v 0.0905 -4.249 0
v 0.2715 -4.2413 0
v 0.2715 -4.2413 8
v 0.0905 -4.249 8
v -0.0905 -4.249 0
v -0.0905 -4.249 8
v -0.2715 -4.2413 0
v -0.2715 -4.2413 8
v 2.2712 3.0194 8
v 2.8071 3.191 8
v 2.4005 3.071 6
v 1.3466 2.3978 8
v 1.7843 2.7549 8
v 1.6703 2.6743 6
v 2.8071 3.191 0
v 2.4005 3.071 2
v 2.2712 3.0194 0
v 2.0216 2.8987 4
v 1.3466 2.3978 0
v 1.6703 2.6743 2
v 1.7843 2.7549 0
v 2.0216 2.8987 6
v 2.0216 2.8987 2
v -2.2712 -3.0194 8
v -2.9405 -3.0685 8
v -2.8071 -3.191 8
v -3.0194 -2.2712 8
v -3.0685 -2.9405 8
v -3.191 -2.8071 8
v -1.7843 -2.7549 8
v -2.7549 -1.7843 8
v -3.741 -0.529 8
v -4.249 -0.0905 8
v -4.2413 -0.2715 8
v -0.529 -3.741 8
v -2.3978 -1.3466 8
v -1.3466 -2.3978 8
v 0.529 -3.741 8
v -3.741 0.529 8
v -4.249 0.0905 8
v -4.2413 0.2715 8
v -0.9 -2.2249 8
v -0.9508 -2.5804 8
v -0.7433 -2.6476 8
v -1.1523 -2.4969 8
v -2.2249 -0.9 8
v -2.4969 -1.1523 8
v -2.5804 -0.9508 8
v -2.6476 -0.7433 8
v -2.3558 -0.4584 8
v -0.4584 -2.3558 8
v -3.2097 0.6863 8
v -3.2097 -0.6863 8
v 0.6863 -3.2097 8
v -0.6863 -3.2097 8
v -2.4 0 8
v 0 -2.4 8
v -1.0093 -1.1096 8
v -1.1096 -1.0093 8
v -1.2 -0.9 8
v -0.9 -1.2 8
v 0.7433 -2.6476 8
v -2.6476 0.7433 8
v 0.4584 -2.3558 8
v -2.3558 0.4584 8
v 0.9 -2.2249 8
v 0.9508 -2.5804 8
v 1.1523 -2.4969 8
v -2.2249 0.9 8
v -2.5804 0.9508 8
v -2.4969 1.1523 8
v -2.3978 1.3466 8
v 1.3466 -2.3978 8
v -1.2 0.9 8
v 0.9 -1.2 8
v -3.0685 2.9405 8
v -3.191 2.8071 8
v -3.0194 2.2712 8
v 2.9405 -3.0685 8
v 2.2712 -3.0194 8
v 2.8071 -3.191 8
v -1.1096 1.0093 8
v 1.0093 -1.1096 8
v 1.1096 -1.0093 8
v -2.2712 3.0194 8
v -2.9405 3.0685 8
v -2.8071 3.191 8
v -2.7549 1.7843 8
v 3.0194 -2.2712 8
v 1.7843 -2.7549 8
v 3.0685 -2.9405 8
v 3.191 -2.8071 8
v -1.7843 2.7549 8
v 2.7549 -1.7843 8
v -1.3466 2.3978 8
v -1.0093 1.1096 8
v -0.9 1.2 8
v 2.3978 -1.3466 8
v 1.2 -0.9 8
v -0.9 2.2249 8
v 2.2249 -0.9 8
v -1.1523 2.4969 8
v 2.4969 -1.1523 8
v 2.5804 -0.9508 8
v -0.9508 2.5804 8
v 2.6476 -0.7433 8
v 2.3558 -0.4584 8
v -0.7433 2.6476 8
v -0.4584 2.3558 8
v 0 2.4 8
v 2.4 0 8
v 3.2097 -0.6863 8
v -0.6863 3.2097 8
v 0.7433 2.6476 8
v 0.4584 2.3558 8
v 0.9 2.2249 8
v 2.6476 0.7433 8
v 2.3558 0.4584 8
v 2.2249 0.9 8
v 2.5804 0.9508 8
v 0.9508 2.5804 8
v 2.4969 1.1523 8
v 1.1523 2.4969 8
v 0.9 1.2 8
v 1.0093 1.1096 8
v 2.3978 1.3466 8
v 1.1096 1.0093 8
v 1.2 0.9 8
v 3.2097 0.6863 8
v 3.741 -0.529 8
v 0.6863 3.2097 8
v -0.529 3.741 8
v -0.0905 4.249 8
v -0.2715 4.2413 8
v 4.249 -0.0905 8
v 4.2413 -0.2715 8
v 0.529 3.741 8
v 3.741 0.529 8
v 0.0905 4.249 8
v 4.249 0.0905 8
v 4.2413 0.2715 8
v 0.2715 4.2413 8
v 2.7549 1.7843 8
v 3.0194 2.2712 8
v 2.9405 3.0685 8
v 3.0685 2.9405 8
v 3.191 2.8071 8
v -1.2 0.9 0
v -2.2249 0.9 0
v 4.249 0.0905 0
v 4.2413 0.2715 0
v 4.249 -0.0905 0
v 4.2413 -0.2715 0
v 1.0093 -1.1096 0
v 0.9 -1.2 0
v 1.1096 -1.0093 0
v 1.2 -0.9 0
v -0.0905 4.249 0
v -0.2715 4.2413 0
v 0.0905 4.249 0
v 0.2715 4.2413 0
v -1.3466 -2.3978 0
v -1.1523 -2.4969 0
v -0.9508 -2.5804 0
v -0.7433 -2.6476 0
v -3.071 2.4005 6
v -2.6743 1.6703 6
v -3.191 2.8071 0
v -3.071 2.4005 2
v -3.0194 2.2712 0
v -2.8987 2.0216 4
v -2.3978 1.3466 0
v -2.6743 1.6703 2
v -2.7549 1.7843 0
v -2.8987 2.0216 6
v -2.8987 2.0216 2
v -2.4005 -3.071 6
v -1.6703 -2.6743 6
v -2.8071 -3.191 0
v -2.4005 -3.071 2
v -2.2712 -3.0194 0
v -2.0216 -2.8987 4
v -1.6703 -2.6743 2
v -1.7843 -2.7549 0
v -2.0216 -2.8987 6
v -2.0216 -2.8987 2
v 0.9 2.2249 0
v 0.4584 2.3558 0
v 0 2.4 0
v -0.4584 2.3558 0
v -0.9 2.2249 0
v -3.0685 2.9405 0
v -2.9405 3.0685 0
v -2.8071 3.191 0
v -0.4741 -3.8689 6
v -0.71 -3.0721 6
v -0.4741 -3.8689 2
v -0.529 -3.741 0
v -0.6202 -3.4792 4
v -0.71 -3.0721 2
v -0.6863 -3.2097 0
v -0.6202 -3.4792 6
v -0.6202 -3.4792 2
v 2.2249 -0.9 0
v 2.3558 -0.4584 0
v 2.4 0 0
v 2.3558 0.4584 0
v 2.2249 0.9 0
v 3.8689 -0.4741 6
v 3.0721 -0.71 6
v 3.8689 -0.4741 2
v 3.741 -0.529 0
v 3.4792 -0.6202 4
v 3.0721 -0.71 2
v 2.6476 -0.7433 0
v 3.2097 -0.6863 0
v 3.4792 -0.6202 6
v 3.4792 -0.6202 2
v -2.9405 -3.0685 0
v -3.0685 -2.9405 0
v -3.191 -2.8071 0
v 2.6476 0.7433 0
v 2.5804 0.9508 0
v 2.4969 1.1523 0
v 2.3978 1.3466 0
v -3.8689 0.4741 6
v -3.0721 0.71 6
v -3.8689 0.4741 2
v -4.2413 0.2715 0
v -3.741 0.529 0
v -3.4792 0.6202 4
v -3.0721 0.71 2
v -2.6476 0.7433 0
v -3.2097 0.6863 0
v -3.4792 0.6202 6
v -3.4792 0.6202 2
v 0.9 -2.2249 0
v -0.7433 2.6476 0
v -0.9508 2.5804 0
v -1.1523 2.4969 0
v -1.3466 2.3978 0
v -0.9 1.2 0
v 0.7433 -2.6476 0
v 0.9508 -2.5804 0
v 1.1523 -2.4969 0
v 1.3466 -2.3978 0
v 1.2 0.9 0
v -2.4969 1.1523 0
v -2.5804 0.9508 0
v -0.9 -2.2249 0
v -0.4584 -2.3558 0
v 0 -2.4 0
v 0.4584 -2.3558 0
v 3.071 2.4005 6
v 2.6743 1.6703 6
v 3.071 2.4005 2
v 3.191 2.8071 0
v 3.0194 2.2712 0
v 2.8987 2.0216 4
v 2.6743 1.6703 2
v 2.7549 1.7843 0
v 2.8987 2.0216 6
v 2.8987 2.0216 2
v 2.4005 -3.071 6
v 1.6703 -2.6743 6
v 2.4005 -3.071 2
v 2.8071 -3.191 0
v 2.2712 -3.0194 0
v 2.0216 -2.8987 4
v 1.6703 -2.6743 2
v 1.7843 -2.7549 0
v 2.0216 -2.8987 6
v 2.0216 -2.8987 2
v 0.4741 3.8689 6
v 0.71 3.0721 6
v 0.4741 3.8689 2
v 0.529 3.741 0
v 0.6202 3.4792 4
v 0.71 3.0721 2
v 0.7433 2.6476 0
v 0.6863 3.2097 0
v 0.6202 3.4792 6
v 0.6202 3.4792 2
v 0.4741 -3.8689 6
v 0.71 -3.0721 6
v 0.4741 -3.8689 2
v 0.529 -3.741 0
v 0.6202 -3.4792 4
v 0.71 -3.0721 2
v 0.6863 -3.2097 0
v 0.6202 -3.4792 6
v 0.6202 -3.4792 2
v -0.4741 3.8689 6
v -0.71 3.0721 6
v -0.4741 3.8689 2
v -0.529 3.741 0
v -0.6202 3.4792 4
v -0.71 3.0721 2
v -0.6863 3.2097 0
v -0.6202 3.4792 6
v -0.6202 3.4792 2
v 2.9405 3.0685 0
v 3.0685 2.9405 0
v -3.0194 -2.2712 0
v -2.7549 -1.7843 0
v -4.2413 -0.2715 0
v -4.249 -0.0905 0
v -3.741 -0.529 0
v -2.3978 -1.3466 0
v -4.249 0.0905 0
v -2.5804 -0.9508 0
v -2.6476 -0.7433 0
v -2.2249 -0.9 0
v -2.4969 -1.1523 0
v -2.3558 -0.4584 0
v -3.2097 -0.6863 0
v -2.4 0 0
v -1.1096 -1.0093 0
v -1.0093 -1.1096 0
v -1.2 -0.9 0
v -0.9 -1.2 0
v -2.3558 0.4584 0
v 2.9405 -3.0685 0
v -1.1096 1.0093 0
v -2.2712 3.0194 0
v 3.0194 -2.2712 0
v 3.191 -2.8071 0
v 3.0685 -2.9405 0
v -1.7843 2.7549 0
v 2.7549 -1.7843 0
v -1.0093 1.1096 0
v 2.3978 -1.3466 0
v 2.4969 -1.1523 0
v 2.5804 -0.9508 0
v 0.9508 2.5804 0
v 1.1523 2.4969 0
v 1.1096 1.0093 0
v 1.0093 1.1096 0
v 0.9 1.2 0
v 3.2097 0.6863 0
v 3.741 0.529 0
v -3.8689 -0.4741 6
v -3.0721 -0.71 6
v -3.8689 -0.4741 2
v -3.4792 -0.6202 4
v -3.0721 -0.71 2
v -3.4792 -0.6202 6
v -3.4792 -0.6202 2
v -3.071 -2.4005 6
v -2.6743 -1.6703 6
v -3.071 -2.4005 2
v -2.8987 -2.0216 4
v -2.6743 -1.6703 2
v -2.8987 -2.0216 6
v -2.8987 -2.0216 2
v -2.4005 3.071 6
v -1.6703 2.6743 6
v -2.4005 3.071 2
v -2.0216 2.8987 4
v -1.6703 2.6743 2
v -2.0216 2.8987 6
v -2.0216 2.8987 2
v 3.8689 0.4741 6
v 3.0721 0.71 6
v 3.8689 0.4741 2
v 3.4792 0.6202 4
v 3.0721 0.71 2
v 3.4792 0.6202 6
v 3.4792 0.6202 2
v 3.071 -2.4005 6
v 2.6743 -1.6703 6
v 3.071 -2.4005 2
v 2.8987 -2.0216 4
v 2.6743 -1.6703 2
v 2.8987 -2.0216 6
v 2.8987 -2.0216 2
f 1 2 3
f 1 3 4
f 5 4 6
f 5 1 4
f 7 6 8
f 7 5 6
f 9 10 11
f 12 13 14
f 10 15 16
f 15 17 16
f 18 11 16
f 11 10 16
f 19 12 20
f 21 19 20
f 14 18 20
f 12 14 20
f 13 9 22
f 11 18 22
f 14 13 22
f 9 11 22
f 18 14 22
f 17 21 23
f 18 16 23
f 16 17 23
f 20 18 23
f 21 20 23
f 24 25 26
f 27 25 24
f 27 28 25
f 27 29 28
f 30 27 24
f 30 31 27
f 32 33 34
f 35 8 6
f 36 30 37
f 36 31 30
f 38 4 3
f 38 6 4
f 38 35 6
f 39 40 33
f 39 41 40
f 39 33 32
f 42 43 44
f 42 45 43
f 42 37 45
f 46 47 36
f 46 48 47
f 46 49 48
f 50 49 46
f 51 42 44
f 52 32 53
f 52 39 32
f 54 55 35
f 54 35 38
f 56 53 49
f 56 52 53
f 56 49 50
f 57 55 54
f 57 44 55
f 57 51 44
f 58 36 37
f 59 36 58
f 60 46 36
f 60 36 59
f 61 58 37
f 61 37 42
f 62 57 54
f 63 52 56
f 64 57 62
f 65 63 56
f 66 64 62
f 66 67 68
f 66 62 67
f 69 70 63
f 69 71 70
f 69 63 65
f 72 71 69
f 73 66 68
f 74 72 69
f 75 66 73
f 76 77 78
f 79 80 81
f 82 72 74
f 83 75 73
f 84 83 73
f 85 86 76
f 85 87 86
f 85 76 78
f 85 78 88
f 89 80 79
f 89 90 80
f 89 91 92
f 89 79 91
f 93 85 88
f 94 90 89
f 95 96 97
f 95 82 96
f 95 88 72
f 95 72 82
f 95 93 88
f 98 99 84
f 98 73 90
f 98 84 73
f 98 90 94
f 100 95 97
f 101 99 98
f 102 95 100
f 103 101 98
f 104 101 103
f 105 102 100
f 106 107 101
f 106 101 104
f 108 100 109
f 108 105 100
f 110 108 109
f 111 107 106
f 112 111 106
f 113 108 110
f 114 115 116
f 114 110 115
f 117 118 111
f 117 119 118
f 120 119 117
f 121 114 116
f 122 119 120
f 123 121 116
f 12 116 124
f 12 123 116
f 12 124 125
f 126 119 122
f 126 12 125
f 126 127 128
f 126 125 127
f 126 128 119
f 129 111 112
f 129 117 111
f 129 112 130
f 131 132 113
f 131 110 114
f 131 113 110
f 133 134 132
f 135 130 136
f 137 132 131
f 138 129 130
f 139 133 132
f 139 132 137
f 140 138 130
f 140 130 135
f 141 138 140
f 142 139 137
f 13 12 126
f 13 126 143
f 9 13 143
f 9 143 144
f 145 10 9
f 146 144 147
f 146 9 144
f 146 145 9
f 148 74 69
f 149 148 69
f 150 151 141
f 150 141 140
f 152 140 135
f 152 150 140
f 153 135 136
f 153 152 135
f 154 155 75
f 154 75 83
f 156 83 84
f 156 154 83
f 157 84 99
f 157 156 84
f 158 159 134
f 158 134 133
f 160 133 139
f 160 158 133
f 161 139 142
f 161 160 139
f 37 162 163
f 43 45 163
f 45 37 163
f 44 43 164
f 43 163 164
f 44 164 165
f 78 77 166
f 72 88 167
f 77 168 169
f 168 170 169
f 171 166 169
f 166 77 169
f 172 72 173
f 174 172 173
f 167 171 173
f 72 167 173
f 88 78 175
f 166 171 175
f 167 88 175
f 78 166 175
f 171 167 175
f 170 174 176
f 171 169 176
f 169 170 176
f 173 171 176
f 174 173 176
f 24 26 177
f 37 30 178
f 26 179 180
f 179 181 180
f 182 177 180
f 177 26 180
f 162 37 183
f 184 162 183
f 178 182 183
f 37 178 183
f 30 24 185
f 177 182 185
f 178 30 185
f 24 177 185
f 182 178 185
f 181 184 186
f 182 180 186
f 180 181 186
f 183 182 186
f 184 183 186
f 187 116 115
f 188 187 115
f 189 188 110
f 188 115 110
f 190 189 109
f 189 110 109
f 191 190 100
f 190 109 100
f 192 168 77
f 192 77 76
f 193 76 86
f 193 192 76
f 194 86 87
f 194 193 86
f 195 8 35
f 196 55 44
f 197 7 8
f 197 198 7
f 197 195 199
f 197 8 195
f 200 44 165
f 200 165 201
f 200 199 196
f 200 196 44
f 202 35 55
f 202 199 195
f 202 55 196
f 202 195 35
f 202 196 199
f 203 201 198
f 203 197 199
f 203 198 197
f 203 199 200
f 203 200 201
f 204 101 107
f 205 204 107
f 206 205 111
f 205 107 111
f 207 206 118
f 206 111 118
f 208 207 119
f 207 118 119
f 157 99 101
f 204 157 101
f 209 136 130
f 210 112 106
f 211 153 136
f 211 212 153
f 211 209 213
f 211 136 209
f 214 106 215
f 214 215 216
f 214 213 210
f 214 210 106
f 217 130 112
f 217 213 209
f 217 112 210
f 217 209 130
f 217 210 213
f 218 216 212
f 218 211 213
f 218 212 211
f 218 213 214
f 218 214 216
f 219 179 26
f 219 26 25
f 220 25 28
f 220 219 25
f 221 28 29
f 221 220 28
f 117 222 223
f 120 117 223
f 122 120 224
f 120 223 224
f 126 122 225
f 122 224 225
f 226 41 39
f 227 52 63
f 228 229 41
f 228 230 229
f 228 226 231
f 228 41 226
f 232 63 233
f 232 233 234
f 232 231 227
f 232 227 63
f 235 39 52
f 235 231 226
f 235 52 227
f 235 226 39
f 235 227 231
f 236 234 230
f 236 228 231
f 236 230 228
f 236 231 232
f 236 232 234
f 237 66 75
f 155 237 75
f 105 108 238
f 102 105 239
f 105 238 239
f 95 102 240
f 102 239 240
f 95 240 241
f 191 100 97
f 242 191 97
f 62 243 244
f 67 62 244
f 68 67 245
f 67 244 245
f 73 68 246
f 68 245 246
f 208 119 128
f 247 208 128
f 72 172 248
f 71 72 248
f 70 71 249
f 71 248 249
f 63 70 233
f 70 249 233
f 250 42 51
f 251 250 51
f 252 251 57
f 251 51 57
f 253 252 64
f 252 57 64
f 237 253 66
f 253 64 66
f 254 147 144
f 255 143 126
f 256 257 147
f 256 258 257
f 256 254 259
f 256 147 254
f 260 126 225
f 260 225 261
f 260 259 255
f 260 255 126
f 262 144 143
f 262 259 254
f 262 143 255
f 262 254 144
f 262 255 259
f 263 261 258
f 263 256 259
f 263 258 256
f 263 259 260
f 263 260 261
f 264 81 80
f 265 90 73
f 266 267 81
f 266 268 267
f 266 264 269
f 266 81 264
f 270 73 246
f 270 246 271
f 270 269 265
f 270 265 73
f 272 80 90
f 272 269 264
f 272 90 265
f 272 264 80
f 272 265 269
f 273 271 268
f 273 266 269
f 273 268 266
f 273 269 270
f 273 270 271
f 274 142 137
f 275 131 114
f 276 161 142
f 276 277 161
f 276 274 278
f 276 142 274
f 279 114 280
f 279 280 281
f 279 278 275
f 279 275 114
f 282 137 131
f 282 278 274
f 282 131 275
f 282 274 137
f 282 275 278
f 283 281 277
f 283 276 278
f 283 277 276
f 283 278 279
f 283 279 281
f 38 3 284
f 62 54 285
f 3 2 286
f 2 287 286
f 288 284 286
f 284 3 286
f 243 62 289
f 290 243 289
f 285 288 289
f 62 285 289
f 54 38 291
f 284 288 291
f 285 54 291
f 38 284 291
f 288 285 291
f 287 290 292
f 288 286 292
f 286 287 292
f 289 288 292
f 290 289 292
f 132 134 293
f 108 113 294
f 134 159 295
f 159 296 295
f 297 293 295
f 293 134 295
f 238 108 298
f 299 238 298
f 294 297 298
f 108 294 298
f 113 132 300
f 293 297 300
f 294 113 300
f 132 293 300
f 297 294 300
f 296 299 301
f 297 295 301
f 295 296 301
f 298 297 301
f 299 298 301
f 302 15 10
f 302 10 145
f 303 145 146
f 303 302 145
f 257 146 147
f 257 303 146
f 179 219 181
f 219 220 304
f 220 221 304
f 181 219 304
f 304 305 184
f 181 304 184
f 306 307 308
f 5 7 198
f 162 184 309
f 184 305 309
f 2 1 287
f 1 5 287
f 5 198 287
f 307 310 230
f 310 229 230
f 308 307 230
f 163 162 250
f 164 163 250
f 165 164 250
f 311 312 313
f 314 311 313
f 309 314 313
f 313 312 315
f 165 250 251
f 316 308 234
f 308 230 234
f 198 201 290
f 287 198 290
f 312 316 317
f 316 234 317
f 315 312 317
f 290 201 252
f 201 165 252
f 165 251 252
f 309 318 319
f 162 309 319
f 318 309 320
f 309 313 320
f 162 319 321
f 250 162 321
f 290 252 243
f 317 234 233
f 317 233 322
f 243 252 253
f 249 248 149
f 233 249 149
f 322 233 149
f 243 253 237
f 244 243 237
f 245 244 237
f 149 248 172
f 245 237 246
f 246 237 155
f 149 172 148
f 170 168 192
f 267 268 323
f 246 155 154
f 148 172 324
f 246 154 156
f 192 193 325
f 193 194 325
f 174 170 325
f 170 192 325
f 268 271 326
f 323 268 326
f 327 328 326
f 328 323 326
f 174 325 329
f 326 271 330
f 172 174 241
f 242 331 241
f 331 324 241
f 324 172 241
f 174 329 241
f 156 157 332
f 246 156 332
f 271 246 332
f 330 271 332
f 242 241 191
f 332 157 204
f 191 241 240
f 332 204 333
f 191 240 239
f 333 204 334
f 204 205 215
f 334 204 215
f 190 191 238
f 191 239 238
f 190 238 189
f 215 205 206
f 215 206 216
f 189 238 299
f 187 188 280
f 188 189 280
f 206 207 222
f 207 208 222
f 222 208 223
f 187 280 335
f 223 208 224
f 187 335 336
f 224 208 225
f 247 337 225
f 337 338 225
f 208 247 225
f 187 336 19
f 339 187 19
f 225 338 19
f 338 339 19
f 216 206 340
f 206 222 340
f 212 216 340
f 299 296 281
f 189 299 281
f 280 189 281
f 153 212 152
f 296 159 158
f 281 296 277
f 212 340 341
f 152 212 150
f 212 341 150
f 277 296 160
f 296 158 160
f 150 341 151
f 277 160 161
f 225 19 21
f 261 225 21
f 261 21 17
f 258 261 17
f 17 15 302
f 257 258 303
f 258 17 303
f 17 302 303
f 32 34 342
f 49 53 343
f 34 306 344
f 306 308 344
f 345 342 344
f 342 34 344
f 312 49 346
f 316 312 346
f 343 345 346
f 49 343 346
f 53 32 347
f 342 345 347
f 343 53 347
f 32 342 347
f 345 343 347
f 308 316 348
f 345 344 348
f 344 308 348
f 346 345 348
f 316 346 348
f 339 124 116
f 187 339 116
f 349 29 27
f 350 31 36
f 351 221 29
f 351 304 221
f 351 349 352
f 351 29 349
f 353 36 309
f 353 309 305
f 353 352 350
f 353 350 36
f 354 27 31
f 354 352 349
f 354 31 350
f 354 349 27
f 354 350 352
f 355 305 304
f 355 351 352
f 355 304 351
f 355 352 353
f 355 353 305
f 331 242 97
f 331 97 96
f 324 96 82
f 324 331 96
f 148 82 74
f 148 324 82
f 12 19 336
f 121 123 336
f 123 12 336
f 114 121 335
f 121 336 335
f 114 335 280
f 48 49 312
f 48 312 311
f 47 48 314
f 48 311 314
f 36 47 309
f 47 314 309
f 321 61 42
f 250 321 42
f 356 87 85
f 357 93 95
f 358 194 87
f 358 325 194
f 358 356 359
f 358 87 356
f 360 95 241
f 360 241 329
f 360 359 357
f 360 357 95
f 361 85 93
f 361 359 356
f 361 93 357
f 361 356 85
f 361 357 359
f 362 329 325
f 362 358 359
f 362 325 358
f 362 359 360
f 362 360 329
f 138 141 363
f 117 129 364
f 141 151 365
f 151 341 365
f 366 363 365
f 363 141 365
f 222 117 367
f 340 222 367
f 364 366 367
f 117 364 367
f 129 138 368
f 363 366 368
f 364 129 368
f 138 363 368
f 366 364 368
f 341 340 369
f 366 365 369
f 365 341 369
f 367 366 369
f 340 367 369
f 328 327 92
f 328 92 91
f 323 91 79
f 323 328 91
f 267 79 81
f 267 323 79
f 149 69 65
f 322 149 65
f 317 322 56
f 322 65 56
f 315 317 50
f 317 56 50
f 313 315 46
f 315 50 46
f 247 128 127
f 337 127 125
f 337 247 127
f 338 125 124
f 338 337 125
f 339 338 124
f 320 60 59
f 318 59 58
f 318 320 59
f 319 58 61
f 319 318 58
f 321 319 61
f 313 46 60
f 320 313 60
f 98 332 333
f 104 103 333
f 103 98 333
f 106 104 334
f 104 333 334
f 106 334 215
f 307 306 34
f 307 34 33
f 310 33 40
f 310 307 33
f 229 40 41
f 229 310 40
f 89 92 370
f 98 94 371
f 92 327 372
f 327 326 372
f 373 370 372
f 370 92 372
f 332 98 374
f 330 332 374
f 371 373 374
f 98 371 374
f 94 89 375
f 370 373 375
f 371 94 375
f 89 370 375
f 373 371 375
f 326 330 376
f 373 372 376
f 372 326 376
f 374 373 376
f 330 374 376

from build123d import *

# Parameters (mm, degrees)
SKETCH1_R           = 2.75
SKETCH1_R_2         = 1.5
BOSS_EXTRUDE1_DEPTH = 8
BOSS_EXTRUDE2_START = -8
BOSS_EXTRUDE2_DEPTH = 8
CIRPATTERN2_COUNT   = 8
CUT_EXTRUDE1_DEPTH  = 10


with BuildPart() as part:
    # Sketch1 → Boss-Extrude1 (new body)
    with BuildSketch(Plane.XY):
        Circle(SKETCH1_R)
        Circle(SKETCH1_R_2, mode=Mode.SUBTRACT)
    extrude(amount=BOSS_EXTRUDE1_DEPTH)

    # Sketch3 → Boss-Extrude2 (add)
    with BuildSketch(Plane.XY.offset(8).offset(BOSS_EXTRUDE2_START)):
        with BuildLine():
            ThreePointArc((0.743305991, 2.647639742), (0, 2.75), (-0.743305991, 2.647639742))
            add(Edge.make_bspline(
                [(-0.271475541, 4.241320671), (-0.733052657, 3.513929186), (-0.743305991, 2.647639742)],
                knots=[0, 0, 0, 1, 1, 1], degree=2))
            ThreePointArc((-0.271475541, 4.241320671), (0, 4.25), (0.271475541, 4.241320671))
            add(Edge.make_bspline(
                [(0.271475541, 4.241320671), (0.733052657, 3.513929186), (0.743305991, 2.647639742)],
                knots=[0, 0, 0, 1, 1, 1], degree=2))
        make_face()
    boss_extrude2 = extrude(amount=BOSS_EXTRUDE2_DEPTH)

    # CirPattern2: Boss-Extrude2 ×8 about axis
    cirpattern2_axis = Axis((0, 0, 8), (0, 0, -1))
    for i in range(1, CIRPATTERN2_COUNT):
        add(boss_extrude2.rotate(cirpattern2_axis, i * 360 / CIRPATTERN2_COUNT))

    # Sketch4 → Cut-Extrude1 (cut)
    with BuildSketch(Plane.XY.offset(8)):
        with BuildLine():
            Line((-0.9, 2.224859546), (-0.9, 0.9))
            Line((-0.9, 0.9), (-2.224859546, 0.9))
            ThreePointArc((-2.224859546, 0.9), (-2.4, 0), (-2.224859546, -0.9))
            Line((-2.224859546, -0.9), (-0.9, -0.9))
            Line((-0.9, -0.9), (-0.9, -2.224859546))
            ThreePointArc((-0.9, -2.224859546), (0, -2.4), (0.9, -2.224859546))
            Line((0.9, -2.224859546), (0.9, -0.9))
            Line((0.9, -0.9), (2.224859546, -0.9))
            ThreePointArc((2.224859546, -0.9), (2.4, 0), (2.224859546, 0.9))
            Line((2.224859546, 0.9), (0.9, 0.9))
            Line((0.9, 0.9), (0.9, 2.224859546))
            ThreePointArc((0.9, 2.224859546), (0, 2.4), (-0.9, 2.224859546))
        make_face()
    extrude(amount=-CUT_EXTRUDE1_DEPTH, mode=Mode.SUBTRACT)


solid = part.part
